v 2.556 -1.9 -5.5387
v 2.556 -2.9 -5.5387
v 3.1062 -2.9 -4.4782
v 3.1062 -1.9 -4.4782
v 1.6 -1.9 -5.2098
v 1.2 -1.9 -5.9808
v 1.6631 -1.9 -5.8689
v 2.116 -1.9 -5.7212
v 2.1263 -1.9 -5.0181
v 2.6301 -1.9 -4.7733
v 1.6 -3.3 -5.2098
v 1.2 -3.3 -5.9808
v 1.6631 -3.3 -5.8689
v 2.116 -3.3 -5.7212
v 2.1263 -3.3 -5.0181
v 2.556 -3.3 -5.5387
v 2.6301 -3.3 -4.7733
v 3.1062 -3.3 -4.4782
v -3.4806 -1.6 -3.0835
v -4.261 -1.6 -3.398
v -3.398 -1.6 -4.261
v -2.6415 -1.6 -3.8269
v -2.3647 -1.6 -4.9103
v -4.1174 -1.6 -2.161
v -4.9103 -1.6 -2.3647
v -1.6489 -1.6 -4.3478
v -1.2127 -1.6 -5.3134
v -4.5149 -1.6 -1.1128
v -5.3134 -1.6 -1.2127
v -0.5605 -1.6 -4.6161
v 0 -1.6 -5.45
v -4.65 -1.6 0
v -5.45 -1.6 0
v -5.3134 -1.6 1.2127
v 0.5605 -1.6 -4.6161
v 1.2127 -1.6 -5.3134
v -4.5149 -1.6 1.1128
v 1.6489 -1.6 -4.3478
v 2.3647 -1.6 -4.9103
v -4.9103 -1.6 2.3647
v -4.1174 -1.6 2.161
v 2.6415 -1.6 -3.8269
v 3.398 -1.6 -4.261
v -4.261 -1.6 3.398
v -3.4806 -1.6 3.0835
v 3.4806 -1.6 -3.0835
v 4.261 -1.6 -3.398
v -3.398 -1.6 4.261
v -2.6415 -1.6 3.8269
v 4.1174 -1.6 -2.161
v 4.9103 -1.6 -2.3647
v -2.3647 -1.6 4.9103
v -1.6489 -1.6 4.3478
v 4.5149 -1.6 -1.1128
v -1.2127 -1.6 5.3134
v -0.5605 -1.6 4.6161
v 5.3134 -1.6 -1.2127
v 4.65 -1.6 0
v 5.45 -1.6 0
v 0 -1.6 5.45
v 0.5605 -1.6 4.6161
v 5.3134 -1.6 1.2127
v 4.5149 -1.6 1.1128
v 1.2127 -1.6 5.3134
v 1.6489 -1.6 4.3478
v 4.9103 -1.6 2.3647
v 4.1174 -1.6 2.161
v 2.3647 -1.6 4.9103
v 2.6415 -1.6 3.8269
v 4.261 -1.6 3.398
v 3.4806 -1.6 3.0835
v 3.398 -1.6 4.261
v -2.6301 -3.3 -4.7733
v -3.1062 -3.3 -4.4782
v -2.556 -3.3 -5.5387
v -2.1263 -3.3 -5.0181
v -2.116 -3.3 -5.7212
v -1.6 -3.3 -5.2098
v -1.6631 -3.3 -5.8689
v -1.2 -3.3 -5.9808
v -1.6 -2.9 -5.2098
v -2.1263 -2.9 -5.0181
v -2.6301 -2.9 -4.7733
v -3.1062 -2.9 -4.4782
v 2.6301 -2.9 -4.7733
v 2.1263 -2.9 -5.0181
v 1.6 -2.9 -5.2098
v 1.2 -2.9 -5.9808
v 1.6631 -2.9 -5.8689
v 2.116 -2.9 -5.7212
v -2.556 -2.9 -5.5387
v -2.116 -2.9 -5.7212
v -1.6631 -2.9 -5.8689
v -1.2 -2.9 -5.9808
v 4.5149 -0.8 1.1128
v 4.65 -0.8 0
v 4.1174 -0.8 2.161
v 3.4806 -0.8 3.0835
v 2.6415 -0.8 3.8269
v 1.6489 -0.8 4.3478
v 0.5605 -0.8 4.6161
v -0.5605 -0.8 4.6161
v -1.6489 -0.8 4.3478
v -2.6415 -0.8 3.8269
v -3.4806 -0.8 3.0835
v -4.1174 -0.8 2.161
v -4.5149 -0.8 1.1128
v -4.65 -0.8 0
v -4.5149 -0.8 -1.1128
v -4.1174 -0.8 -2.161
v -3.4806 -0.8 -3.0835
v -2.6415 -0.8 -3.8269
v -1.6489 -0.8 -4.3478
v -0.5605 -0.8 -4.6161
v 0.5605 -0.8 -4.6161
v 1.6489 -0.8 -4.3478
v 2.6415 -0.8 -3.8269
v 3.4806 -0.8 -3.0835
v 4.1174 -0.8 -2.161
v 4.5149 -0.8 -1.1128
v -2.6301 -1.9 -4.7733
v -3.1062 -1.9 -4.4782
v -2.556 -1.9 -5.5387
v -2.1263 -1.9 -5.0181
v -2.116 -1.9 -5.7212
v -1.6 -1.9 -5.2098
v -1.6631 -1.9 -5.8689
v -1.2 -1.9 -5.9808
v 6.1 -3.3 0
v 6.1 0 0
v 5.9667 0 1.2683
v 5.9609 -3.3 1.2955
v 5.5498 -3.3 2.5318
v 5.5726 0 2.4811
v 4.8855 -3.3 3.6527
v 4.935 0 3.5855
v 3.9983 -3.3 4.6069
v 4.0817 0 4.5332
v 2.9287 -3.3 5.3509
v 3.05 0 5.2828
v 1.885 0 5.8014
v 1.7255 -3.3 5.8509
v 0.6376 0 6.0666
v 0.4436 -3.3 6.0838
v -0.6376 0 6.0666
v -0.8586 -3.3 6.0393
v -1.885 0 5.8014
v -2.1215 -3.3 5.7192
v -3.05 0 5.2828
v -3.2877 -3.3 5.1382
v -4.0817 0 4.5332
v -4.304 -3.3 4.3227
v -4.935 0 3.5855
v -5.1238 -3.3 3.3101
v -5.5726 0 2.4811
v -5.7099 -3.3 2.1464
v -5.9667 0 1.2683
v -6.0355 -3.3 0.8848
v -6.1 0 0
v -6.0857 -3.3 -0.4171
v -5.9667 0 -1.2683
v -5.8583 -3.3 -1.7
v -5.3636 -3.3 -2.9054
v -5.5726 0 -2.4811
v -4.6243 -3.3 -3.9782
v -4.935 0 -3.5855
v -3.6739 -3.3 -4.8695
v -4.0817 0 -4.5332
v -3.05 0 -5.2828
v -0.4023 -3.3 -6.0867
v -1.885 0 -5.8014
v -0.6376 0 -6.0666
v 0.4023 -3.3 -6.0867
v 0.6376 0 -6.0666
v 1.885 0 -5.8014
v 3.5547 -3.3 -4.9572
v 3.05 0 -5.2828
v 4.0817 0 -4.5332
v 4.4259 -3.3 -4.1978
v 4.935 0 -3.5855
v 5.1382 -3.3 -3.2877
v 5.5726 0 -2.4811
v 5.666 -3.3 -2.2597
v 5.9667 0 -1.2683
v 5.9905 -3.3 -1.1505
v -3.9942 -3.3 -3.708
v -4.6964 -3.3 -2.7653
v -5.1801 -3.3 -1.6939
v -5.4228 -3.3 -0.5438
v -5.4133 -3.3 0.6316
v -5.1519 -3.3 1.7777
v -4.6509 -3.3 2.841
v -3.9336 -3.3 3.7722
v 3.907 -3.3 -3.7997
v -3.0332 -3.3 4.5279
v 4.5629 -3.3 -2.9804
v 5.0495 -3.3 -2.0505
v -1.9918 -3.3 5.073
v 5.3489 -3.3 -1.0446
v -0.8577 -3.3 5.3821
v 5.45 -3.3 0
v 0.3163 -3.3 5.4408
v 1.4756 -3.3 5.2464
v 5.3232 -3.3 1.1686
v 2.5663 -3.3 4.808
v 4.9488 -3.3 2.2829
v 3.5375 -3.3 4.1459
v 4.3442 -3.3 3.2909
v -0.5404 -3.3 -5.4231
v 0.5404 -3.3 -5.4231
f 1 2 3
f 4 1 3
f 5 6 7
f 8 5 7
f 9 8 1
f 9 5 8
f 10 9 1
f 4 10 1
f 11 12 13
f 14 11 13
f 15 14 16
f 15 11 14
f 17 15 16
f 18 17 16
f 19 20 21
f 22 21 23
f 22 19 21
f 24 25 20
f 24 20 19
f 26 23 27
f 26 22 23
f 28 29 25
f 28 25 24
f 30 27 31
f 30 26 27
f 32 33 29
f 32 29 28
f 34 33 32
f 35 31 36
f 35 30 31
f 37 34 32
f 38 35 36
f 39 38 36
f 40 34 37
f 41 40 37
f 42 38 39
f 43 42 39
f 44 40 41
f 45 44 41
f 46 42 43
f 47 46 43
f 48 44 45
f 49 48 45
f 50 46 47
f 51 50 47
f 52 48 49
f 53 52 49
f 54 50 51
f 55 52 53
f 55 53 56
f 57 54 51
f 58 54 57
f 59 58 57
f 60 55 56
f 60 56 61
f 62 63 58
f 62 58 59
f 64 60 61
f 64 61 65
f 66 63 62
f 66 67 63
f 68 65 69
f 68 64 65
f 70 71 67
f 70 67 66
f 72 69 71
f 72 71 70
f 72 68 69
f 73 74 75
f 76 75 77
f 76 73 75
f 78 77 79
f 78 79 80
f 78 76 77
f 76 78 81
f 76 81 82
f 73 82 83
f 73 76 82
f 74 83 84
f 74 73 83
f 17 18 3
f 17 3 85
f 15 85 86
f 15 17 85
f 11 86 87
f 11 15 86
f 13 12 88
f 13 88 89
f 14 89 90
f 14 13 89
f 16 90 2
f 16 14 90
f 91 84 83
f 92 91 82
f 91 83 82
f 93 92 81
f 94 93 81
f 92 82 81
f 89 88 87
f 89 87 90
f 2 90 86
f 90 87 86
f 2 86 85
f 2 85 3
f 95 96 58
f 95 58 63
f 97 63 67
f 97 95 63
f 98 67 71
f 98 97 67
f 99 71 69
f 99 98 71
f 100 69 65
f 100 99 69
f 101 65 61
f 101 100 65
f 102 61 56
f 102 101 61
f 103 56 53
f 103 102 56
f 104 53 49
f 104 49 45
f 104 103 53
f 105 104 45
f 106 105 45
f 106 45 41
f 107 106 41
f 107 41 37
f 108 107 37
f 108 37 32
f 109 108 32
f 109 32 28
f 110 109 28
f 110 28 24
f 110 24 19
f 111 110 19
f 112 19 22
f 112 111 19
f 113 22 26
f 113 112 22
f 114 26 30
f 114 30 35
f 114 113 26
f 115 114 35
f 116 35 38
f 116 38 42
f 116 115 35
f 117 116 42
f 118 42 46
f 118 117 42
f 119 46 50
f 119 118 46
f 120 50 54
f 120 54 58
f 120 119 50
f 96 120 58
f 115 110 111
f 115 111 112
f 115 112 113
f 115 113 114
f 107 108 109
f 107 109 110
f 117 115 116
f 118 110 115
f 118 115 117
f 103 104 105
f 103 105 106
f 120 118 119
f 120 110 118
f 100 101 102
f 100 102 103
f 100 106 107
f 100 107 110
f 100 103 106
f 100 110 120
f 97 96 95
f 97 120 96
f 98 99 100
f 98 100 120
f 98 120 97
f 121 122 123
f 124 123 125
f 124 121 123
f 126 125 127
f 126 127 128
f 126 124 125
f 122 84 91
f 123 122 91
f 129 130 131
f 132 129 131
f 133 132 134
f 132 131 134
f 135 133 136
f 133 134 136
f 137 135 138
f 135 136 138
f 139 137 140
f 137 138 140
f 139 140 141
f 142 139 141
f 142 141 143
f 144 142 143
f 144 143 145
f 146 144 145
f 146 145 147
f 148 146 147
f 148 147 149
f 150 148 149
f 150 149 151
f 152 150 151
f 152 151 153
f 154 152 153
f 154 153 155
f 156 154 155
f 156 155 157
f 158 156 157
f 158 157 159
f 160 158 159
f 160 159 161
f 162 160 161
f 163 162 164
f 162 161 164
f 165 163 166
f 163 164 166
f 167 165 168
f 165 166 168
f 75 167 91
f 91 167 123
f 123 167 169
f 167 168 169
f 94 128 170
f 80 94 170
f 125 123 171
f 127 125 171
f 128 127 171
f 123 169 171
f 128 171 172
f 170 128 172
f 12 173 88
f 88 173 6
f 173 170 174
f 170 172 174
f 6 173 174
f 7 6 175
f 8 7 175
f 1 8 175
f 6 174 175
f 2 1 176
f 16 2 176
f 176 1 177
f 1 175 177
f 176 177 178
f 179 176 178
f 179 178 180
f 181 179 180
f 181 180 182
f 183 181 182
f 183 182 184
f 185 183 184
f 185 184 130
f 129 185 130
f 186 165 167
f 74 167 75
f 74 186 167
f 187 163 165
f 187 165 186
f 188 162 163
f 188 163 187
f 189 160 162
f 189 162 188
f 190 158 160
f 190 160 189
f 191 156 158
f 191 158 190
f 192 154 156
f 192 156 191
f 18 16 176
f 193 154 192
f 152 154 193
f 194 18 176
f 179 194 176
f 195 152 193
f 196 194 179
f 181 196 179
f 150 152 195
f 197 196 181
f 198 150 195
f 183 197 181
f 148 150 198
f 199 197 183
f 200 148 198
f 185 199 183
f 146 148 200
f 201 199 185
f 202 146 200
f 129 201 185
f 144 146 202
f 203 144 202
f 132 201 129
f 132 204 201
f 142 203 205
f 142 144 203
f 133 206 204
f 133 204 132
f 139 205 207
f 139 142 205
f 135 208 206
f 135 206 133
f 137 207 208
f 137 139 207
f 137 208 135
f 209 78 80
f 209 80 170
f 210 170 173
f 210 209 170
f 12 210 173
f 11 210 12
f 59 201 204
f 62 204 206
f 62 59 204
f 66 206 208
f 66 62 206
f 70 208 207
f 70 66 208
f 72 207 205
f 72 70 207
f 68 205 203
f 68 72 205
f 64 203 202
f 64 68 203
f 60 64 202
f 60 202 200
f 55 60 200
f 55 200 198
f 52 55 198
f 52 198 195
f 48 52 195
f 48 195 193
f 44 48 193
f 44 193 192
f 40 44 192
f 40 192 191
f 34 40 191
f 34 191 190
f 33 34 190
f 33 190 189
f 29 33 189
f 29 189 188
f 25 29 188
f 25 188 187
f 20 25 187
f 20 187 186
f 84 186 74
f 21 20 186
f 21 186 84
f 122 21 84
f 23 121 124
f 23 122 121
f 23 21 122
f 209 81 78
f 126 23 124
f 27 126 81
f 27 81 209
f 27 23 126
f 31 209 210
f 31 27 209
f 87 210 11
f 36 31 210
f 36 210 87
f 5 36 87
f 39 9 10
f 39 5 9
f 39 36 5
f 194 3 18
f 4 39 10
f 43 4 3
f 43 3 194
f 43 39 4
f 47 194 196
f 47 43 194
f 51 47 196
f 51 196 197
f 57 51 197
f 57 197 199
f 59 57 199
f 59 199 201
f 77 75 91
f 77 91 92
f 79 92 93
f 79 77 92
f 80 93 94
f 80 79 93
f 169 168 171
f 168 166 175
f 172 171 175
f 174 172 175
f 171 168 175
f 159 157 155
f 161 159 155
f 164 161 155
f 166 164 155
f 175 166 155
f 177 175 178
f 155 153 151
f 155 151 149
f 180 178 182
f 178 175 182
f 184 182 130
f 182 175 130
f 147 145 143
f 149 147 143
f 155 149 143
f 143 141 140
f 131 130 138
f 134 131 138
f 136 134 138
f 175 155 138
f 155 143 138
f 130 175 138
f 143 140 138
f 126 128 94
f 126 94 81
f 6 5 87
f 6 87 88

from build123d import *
from build123d import SkipClean  # not in build123d's __all__

# Parameters (mm, degrees)
F0_R     = 6.1
F0_R_2   = 5
F1_DEPTH = 0.8
F2_R     = 6.1
F2_R_2   = 5.45
F3_DEPTH = 2.5
F4_R     = 5.45
F4_R_2   = 4.65
F5_DEPTH = 0.8
F7_DEPTH = 1.4
F9_DEPTH = 0.4


with BuildPart() as f1:
    # F0 (on Front) → F1 (new body)
    with BuildSketch(Plane.XZ):
        Circle(F0_R)
        Circle(F0_R_2, mode=Mode.SUBTRACT)
        Circle(F0_R_2)
    extrude(amount=F1_DEPTH)

    # F2 (on face) → F3 (join)
    with BuildSketch(Plane.XZ.offset(0.8)):
        Circle(F2_R)
        Circle(F2_R_2, mode=Mode.SUBTRACT)
    extrude(amount=F3_DEPTH)

    # F4 (on face) → F5 (join)
    with BuildSketch(Plane.XZ.offset(0.8)):
        Circle(F4_R)
        Circle(F4_R_2, mode=Mode.SUBTRACT)
    extrude(amount=F5_DEPTH)

    # F6 (on face) → F7 (cut)
    with BuildSketch(Plane.XZ.offset(3.3)):
        with BuildLine():
            Line((-1.2, -5.9808026217), (-1.6, -5.2098464469))
            ThreePointArc((-1.6, -5.2098464469), (-2.3813713563, -4.9022005735), (-3.1062049616, -4.4781682345))
            Line((-3.1062049616, -4.4781682345), (-2.555971444, -5.5386830544))
            ThreePointArc((-2.555971444, -5.5386830544), (-1.8909515594, -5.7995087895), (-1.2, -5.9808026217))
        make_face()
        with BuildLine():
            ThreePointArc((3.1062049616, -4.4781682345), (2.3813713563, -4.9022005735), (1.6, -5.2098464469))
            Line((1.6, -5.2098464469), (1.2, -5.9808026217))
            ThreePointArc((1.2, -5.9808026217), (1.8909515594, -5.7995087895), (2.555971444, -5.5386830544))
            Line((2.555971444, -5.5386830544), (3.1062049616, -4.4781682345))
        make_face()
    extrude(amount=-F7_DEPTH, mode=Mode.SUBTRACT)

    # F8 (on face) → F9 (join)
    with BuildSketch(Plane.XZ.offset(3.3)):
        with BuildLine():
            ThreePointArc((-1.6, -5.2098464469), (-2.3813713563, -4.9022005735), (-3.1062049616, -4.4781682345))
            Line((-3.1062049616, -4.4781682345), (-2.555971444, -5.5386830544))
            ThreePointArc((-2.555971444, -5.5386830544), (-1.8909515594, -5.7995087895), (-1.2, -5.9808026217))
            Line((-1.2, -5.9808026217), (-1.6, -5.2098464469))
        make_face()
        with BuildLine():
            Line((2.555971444, -5.5386830544), (3.1062049616, -4.4781682345))
            ThreePointArc((3.1062049616, -4.4781682345), (2.3813713563, -4.9022005735), (1.6, -5.2098464469))
            Line((1.6, -5.2098464469), (1.2, -5.9808026217))
            ThreePointArc((1.2, -5.9808026217), (1.8909515594, -5.7995087895), (2.555971444, -5.5386830544))
        make_face()
    with SkipClean():  # cleaning this boolean's faces spoils the solid; the shape is the same uncleaned
        extrude(amount=-F9_DEPTH)


solid = f1.part
